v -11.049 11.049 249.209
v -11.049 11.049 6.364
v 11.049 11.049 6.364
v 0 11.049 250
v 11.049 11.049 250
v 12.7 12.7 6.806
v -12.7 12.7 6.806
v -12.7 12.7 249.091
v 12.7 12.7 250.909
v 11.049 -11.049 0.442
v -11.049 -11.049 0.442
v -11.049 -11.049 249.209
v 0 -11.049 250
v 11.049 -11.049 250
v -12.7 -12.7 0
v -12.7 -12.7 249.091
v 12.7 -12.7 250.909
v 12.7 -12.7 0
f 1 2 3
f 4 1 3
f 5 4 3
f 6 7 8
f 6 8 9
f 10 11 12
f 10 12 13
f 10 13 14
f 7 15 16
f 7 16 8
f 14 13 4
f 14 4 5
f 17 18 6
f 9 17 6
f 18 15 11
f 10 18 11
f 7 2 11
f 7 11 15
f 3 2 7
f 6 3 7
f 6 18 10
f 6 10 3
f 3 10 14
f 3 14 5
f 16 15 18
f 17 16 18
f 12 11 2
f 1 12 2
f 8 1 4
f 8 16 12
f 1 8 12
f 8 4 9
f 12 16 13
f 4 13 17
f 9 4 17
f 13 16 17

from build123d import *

# Parameters (mm, degrees)
SKETCH1_W           = 25.4
SKETCH1_H           = 25.4
SKETCH1_W_2         = 22.098
SKETCH1_H_2         = 22.098
BOSS_EXTRUDE1_DEPTH = 250
SKETCH4_W           = 25.4
SKETCH4_H           = 25.4
BOSS_EXTRUDE2_DEPTH = 25.4
CUT_EXTRUDE1_DEPTH  = 165.021579309
CUT_EXTRUDE2_DEPTH  = 26.4


with BuildPart() as part:
    # Sketch1 → Boss-Extrude1 (new body)
    with BuildSketch(Plane.XY):
        Rectangle(SKETCH1_W, SKETCH1_H)
        Rectangle(SKETCH1_W_2, SKETCH1_H_2, mode=Mode.SUBTRACT)
    extrude(amount=BOSS_EXTRUDE1_DEPTH)

    # Sketch4 → Boss-Extrude2 (add)
    with BuildSketch(Plane.XY.offset(250)):
        Rectangle(SKETCH4_W, SKETCH4_H)
    extrude(amount=BOSS_EXTRUDE2_DEPTH)

    # Sketch5 → Cut-Extrude1 (cut, through all)
    with BuildSketch(Plane(origin=(-589.319373916, -151.321579309, 111.97168159), x_dir=(0, 0, -1), z_dir=(0, 1, 0))):
        Polygon((-140.246306665, -620.299815752), (-213.016787638, -571.728098704), (-135.810330154, -558.33893208), align=None)
    extrude(amount=CUT_EXTRUDE1_DEPTH, mode=Mode.SUBTRACT)

    # Sketch6 → Cut-Extrude2 (cut, through all)
    with BuildSketch(Plane(origin=(12.7, 0, 0), x_dir=(0, 0, -1), z_dir=(1, 0, 0))):
        Polygon((0, -12.7), (-11.495760494, 30.202762236), (0, 24.093064972), align=None)
    extrude(amount=-CUT_EXTRUDE2_DEPTH, mode=Mode.SUBTRACT)


solid = part.part
